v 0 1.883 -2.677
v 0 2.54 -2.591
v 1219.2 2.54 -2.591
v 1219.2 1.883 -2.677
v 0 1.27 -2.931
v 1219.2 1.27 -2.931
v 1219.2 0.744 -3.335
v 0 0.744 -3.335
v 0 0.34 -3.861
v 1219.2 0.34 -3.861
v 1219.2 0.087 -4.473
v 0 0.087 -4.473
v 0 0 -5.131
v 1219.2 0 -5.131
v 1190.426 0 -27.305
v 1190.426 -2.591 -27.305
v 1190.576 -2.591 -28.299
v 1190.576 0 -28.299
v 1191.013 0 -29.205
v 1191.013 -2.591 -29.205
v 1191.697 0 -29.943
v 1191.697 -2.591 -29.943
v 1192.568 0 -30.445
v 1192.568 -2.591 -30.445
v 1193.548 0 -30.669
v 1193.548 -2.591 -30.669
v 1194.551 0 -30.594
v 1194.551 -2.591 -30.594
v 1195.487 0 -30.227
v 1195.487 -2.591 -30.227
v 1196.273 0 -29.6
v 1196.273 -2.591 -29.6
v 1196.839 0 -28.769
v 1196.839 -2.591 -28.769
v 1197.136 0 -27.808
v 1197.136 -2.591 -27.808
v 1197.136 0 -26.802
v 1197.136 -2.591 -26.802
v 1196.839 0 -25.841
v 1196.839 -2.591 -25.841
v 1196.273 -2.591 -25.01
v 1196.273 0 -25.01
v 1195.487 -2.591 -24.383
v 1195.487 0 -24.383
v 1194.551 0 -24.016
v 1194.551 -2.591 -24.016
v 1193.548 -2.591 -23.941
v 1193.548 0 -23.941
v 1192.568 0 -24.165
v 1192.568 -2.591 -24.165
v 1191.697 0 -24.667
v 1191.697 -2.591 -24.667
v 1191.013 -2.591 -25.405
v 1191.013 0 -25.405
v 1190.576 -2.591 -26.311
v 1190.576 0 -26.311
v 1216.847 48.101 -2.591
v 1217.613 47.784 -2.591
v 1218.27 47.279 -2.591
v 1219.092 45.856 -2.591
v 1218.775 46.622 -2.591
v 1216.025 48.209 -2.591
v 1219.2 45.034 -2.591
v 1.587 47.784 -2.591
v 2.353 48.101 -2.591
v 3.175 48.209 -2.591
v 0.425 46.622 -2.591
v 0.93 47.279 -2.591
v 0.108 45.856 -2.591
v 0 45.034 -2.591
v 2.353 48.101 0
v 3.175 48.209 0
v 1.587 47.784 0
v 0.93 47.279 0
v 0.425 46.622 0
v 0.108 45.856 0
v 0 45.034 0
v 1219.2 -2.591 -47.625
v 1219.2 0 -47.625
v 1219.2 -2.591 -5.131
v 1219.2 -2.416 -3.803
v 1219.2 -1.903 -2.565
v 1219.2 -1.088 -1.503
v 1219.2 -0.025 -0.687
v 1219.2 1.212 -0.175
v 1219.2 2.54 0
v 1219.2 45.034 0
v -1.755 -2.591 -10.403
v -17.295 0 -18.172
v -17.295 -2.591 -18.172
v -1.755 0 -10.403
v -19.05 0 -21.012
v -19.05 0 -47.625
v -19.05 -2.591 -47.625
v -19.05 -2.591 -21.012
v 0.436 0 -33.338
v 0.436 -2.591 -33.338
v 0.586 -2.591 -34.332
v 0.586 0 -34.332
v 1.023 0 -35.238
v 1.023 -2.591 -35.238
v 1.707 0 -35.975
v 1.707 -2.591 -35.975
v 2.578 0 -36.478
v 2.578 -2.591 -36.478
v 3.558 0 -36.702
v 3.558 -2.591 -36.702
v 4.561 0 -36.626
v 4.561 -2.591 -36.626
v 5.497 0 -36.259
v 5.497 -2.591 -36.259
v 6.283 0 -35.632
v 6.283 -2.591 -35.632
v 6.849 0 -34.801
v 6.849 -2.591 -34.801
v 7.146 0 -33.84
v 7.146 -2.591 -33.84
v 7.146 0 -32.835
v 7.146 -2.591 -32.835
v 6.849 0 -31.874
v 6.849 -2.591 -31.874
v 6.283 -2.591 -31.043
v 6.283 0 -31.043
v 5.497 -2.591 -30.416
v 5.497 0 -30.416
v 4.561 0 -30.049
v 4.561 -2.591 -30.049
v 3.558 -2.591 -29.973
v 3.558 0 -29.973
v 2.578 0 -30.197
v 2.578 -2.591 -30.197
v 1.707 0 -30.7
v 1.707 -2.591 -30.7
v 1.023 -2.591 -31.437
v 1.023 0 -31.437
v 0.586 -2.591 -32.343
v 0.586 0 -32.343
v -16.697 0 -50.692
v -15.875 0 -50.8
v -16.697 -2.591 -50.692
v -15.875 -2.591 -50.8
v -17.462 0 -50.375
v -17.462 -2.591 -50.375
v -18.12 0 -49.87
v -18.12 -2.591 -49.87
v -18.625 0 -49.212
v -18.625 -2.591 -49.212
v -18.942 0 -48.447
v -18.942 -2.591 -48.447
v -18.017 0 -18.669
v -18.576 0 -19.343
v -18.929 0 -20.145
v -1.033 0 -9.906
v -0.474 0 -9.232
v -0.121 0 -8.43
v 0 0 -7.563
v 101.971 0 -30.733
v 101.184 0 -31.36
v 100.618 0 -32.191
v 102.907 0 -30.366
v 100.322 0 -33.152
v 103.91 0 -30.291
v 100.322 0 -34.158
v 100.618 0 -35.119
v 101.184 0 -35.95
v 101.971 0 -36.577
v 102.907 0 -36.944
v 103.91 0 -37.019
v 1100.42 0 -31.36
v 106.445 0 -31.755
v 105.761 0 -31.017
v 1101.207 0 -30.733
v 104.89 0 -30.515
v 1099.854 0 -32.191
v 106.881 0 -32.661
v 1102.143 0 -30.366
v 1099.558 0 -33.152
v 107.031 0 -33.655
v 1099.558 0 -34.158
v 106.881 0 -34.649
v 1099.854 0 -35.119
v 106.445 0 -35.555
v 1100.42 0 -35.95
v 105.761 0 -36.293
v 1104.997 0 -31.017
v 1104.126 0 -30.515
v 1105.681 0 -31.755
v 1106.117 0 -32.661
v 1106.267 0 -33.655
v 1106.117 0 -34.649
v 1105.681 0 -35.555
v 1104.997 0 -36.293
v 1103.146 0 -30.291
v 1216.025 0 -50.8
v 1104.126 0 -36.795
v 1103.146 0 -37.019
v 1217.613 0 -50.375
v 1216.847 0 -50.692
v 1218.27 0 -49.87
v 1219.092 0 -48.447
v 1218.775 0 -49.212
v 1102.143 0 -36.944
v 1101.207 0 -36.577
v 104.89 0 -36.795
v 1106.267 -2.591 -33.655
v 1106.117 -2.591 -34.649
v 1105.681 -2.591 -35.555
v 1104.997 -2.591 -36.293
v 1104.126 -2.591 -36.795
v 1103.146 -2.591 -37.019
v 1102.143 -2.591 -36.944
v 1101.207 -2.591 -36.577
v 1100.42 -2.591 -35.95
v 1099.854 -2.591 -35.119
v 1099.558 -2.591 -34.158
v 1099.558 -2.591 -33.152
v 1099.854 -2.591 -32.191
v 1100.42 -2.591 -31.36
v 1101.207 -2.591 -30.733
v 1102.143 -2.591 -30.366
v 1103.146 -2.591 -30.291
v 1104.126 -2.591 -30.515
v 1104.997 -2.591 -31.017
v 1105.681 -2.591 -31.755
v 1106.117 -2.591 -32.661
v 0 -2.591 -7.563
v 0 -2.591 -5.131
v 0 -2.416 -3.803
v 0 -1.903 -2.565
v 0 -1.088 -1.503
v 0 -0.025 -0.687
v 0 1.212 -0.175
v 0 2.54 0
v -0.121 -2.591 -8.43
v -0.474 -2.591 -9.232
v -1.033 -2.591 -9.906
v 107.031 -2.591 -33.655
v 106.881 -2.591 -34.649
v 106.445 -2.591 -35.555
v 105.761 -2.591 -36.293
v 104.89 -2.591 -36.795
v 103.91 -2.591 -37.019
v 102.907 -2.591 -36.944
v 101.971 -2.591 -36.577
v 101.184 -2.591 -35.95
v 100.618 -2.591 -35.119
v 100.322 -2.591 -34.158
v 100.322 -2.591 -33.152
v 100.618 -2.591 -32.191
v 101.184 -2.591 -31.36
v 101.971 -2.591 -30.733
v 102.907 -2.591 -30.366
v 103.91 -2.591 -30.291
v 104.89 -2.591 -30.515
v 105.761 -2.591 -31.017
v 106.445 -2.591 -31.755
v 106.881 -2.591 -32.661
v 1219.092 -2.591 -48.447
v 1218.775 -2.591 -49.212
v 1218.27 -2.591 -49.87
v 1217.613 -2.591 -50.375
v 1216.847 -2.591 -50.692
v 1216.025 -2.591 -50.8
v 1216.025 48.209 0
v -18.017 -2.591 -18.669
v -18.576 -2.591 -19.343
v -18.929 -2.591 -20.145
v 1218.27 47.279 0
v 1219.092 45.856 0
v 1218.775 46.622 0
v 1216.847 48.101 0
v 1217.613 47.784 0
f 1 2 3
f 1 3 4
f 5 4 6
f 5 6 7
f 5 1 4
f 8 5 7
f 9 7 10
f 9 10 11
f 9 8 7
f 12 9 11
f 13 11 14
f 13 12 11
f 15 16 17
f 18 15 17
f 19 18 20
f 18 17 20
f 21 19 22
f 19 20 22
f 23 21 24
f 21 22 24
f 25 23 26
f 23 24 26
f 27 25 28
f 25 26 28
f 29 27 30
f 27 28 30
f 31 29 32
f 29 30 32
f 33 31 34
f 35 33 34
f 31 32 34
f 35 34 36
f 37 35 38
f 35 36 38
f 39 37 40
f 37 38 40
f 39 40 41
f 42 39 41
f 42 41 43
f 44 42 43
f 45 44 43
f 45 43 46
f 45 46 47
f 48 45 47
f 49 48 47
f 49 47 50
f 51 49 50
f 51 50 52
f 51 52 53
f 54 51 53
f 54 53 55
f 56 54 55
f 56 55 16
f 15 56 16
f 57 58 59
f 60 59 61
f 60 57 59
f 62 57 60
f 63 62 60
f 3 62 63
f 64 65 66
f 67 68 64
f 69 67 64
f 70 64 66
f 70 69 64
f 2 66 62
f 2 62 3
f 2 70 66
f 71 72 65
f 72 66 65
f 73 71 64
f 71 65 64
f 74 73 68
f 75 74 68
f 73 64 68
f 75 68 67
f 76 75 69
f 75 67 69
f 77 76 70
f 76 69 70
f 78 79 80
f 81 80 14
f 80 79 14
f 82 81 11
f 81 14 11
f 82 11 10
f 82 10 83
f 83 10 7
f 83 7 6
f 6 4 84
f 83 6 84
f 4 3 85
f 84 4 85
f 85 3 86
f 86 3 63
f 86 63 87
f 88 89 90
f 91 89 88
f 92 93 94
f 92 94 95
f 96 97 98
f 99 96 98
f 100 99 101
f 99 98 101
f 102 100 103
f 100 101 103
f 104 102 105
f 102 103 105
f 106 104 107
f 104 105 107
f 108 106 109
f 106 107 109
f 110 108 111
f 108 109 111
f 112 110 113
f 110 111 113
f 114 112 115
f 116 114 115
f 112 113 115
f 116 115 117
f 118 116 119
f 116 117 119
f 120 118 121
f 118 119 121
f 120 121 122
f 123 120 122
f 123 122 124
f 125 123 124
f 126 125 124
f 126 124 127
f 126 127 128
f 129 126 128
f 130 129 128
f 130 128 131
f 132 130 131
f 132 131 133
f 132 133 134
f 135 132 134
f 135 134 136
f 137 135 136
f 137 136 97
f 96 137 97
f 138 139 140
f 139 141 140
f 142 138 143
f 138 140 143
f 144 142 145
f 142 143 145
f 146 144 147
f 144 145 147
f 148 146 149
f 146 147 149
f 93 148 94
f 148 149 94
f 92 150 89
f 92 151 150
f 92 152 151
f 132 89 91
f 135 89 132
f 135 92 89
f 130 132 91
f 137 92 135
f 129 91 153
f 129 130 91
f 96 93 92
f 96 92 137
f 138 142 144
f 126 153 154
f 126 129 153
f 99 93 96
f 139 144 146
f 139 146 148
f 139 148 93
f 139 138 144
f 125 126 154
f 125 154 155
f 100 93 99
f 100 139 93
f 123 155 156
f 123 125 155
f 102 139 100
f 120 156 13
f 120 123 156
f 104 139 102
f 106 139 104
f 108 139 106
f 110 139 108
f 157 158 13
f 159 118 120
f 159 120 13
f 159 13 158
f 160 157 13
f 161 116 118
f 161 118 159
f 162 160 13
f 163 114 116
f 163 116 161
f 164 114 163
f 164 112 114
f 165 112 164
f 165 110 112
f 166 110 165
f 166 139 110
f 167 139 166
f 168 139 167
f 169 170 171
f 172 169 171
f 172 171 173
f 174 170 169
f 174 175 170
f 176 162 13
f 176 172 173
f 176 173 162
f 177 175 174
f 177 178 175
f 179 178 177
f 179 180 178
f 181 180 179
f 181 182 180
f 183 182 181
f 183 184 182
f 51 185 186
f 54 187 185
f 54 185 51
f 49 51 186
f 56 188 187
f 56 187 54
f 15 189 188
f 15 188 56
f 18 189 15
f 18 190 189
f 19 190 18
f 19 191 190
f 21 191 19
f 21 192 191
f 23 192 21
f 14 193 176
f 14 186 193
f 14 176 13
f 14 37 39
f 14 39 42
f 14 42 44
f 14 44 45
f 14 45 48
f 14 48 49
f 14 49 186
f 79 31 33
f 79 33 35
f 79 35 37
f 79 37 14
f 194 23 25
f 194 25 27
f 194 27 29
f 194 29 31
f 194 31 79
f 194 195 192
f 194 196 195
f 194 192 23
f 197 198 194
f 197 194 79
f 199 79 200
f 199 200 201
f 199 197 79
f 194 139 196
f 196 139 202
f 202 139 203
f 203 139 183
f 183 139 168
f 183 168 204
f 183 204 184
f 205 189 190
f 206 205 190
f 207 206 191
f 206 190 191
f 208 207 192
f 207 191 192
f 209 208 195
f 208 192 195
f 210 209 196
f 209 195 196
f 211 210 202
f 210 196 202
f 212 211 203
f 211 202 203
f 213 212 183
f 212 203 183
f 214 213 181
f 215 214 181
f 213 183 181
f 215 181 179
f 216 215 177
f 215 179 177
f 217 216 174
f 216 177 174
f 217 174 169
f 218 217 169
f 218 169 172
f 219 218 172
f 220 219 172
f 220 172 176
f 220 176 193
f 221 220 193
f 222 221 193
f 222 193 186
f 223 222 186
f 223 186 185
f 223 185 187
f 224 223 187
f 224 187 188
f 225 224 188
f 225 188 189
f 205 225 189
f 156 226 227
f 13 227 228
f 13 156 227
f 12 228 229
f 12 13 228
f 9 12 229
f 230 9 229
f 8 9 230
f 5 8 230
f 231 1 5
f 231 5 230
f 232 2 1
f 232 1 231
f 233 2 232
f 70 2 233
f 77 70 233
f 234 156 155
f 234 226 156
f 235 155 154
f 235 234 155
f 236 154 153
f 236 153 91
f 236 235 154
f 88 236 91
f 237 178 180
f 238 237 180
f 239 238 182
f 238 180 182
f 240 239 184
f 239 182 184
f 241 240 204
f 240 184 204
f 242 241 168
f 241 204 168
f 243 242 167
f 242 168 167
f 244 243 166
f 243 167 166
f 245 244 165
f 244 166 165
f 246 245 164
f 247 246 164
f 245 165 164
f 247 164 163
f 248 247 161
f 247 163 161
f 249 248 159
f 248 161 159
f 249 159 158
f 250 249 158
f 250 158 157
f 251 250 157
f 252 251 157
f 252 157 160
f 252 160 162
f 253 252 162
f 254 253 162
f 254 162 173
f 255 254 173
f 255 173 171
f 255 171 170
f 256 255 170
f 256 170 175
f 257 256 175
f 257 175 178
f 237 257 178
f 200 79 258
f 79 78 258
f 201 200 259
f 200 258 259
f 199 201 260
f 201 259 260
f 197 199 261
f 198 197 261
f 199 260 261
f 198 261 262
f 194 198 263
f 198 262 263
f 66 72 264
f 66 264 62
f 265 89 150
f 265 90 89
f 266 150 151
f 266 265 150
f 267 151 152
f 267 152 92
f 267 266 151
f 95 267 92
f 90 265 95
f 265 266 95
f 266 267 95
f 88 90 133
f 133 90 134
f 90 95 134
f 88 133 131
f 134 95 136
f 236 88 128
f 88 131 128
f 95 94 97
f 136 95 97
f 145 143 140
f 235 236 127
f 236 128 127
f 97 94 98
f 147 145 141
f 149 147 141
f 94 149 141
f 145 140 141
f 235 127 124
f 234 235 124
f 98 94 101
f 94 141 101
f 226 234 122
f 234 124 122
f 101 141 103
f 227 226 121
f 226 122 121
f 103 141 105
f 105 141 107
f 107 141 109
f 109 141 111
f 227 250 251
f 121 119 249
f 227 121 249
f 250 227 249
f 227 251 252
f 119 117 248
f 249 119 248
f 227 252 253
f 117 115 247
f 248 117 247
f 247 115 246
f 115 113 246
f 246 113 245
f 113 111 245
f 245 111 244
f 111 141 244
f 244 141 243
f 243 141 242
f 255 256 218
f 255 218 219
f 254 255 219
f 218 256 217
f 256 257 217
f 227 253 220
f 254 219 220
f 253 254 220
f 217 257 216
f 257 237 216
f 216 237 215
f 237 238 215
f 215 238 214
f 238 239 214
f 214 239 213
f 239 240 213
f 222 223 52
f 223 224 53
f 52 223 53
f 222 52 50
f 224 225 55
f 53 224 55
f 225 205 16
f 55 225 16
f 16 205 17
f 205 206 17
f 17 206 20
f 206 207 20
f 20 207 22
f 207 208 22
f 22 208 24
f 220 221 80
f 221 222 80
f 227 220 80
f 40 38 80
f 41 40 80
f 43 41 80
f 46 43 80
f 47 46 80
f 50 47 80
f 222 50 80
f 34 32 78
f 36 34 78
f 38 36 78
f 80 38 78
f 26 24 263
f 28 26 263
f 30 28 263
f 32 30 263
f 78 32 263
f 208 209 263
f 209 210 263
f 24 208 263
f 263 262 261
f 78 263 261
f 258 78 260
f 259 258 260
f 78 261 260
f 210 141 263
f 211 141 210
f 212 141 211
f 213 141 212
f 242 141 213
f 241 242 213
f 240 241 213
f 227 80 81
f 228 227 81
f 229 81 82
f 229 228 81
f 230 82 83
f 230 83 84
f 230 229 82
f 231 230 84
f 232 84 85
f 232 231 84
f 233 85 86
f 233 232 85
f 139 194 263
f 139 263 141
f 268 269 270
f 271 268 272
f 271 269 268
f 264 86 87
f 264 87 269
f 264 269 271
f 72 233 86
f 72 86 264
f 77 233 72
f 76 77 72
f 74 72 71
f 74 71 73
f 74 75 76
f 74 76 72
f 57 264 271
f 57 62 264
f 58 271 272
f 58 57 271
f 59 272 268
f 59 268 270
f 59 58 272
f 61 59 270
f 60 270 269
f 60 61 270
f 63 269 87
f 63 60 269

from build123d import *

# Parameters (mm, degrees)
BASE_FLANGE1_DEPTH               = 2.5908
EDGE_FLANGE1_STRIP_W             = 15.4432
EDGE_FLANGE1_STRIP_H             = 2.5908
EDGE_FLANGE1_STRIP_CUT_DEPTH     = 1219.2
EDGE_FLANGE1_DEPTH               = 1219.2
F_17_64_0_26563_DIAMETER_HOLE1_D = 6.747002
FILLET1_R                        = 3.175
F_17_64_0_26563_DIAMETER_HOLE2_D = 6.747002
F_17_64_0_26563_DIAMETER_HOLE3_D = 6.747002


# Sheet-metal steps are written as plain solids
with BuildPart() as part:
    # Sketch2 → Base-Flange1 (new body)
    with BuildSketch(Plane(origin=(0, 0, 0), x_dir=(1, 0, 0), z_dir=(0, 1, 0))):
        Polygon((0, 0), (1219.2, 0), (1219.2, 50.8), (-19.05, 50.8), (-19.05, 19.05), (0, 9.525), align=None)
    extrude(amount=-BASE_FLANGE1_DEPTH)

    # Edge-Flange1 strip (across the edge) → Edge-Flange1 strip cut (cut)
    with BuildSketch(Plane(origin=(0, 0, 0), x_dir=(0, 0, -1), z_dir=(1, 0, 0))):
        with Locations((-2.5908, -1.2954)):
            Rectangle(EDGE_FLANGE1_STRIP_W, EDGE_FLANGE1_STRIP_H)
    extrude(amount=EDGE_FLANGE1_STRIP_CUT_DEPTH, mode=Mode.SUBTRACT)

    # Edge-Flange1 section (across the edge) → Edge-Flange1 (add)
    with BuildSketch(Plane(origin=(0, 0, 0), x_dir=(0, 0, -1), z_dir=(1, 0, 0))):
        with BuildLine():
            Line((0, 2.54), (0, 48.2092))
            Line((0, 48.2092), (2.5908, 48.2092))
            Line((2.5908, 48.2092), (2.5908, 2.54))
            ThreePointArc((2.5908, 2.54), (3.334748776, 0.743948776), (5.1308, 0))
            Line((5.1308, 0), (5.1308, -2.5908))
            ThreePointArc((5.1308, -2.5908), (1.502776527, -1.088023473), (0, 2.54))
        make_face()
    extrude(amount=EDGE_FLANGE1_DEPTH)

    # 17/64 (0.26563) Diameter Hole1 (through all)
    with Locations(Plane(origin=(0, 0, 0), x_dir=(1, 0, 0), z_dir=(0, 1, 0))):
        with Locations((1193.8, 27.305)):
            Hole(F_17_64_0_26563_DIAMETER_HOLE1_D / 2)

    # Fillet1
    fillet1_edges = [part.edges().sort_by_distance(p)[0] for p in [
        (0, -1.2954, -9.525),
        (-19.05, -1.2954, -19.05),
        (-19.05, -1.2954, -50.8),
        (1219.2, -1.2954, -50.8),
        (0, 48.2092, -1.2954),
        (1219.2, 48.2092, -1.2954),
    ]]
    fillet(fillet1_edges, radius=FILLET1_R)

    # 17/64 (0.26563) Diameter Hole2 (through all)
    with Locations(Plane(origin=(0, 0, 0), x_dir=(1, 0, 0), z_dir=(0, 1, 0))):
        with Locations((3.81, 33.3375)):
            Hole(F_17_64_0_26563_DIAMETER_HOLE2_D / 2)

    # 17/64 (0.26563) Diameter Hole3 (through all)
    with Locations(Plane(origin=(0, -2.5908, 0), x_dir=(-1, 0, 0), z_dir=(0, -1, 0))):
        with Locations((-103.6574, 33.655), (-1102.8934, 33.655)):
            Hole(F_17_64_0_26563_DIAMETER_HOLE3_D / 2)


solid = part.part
